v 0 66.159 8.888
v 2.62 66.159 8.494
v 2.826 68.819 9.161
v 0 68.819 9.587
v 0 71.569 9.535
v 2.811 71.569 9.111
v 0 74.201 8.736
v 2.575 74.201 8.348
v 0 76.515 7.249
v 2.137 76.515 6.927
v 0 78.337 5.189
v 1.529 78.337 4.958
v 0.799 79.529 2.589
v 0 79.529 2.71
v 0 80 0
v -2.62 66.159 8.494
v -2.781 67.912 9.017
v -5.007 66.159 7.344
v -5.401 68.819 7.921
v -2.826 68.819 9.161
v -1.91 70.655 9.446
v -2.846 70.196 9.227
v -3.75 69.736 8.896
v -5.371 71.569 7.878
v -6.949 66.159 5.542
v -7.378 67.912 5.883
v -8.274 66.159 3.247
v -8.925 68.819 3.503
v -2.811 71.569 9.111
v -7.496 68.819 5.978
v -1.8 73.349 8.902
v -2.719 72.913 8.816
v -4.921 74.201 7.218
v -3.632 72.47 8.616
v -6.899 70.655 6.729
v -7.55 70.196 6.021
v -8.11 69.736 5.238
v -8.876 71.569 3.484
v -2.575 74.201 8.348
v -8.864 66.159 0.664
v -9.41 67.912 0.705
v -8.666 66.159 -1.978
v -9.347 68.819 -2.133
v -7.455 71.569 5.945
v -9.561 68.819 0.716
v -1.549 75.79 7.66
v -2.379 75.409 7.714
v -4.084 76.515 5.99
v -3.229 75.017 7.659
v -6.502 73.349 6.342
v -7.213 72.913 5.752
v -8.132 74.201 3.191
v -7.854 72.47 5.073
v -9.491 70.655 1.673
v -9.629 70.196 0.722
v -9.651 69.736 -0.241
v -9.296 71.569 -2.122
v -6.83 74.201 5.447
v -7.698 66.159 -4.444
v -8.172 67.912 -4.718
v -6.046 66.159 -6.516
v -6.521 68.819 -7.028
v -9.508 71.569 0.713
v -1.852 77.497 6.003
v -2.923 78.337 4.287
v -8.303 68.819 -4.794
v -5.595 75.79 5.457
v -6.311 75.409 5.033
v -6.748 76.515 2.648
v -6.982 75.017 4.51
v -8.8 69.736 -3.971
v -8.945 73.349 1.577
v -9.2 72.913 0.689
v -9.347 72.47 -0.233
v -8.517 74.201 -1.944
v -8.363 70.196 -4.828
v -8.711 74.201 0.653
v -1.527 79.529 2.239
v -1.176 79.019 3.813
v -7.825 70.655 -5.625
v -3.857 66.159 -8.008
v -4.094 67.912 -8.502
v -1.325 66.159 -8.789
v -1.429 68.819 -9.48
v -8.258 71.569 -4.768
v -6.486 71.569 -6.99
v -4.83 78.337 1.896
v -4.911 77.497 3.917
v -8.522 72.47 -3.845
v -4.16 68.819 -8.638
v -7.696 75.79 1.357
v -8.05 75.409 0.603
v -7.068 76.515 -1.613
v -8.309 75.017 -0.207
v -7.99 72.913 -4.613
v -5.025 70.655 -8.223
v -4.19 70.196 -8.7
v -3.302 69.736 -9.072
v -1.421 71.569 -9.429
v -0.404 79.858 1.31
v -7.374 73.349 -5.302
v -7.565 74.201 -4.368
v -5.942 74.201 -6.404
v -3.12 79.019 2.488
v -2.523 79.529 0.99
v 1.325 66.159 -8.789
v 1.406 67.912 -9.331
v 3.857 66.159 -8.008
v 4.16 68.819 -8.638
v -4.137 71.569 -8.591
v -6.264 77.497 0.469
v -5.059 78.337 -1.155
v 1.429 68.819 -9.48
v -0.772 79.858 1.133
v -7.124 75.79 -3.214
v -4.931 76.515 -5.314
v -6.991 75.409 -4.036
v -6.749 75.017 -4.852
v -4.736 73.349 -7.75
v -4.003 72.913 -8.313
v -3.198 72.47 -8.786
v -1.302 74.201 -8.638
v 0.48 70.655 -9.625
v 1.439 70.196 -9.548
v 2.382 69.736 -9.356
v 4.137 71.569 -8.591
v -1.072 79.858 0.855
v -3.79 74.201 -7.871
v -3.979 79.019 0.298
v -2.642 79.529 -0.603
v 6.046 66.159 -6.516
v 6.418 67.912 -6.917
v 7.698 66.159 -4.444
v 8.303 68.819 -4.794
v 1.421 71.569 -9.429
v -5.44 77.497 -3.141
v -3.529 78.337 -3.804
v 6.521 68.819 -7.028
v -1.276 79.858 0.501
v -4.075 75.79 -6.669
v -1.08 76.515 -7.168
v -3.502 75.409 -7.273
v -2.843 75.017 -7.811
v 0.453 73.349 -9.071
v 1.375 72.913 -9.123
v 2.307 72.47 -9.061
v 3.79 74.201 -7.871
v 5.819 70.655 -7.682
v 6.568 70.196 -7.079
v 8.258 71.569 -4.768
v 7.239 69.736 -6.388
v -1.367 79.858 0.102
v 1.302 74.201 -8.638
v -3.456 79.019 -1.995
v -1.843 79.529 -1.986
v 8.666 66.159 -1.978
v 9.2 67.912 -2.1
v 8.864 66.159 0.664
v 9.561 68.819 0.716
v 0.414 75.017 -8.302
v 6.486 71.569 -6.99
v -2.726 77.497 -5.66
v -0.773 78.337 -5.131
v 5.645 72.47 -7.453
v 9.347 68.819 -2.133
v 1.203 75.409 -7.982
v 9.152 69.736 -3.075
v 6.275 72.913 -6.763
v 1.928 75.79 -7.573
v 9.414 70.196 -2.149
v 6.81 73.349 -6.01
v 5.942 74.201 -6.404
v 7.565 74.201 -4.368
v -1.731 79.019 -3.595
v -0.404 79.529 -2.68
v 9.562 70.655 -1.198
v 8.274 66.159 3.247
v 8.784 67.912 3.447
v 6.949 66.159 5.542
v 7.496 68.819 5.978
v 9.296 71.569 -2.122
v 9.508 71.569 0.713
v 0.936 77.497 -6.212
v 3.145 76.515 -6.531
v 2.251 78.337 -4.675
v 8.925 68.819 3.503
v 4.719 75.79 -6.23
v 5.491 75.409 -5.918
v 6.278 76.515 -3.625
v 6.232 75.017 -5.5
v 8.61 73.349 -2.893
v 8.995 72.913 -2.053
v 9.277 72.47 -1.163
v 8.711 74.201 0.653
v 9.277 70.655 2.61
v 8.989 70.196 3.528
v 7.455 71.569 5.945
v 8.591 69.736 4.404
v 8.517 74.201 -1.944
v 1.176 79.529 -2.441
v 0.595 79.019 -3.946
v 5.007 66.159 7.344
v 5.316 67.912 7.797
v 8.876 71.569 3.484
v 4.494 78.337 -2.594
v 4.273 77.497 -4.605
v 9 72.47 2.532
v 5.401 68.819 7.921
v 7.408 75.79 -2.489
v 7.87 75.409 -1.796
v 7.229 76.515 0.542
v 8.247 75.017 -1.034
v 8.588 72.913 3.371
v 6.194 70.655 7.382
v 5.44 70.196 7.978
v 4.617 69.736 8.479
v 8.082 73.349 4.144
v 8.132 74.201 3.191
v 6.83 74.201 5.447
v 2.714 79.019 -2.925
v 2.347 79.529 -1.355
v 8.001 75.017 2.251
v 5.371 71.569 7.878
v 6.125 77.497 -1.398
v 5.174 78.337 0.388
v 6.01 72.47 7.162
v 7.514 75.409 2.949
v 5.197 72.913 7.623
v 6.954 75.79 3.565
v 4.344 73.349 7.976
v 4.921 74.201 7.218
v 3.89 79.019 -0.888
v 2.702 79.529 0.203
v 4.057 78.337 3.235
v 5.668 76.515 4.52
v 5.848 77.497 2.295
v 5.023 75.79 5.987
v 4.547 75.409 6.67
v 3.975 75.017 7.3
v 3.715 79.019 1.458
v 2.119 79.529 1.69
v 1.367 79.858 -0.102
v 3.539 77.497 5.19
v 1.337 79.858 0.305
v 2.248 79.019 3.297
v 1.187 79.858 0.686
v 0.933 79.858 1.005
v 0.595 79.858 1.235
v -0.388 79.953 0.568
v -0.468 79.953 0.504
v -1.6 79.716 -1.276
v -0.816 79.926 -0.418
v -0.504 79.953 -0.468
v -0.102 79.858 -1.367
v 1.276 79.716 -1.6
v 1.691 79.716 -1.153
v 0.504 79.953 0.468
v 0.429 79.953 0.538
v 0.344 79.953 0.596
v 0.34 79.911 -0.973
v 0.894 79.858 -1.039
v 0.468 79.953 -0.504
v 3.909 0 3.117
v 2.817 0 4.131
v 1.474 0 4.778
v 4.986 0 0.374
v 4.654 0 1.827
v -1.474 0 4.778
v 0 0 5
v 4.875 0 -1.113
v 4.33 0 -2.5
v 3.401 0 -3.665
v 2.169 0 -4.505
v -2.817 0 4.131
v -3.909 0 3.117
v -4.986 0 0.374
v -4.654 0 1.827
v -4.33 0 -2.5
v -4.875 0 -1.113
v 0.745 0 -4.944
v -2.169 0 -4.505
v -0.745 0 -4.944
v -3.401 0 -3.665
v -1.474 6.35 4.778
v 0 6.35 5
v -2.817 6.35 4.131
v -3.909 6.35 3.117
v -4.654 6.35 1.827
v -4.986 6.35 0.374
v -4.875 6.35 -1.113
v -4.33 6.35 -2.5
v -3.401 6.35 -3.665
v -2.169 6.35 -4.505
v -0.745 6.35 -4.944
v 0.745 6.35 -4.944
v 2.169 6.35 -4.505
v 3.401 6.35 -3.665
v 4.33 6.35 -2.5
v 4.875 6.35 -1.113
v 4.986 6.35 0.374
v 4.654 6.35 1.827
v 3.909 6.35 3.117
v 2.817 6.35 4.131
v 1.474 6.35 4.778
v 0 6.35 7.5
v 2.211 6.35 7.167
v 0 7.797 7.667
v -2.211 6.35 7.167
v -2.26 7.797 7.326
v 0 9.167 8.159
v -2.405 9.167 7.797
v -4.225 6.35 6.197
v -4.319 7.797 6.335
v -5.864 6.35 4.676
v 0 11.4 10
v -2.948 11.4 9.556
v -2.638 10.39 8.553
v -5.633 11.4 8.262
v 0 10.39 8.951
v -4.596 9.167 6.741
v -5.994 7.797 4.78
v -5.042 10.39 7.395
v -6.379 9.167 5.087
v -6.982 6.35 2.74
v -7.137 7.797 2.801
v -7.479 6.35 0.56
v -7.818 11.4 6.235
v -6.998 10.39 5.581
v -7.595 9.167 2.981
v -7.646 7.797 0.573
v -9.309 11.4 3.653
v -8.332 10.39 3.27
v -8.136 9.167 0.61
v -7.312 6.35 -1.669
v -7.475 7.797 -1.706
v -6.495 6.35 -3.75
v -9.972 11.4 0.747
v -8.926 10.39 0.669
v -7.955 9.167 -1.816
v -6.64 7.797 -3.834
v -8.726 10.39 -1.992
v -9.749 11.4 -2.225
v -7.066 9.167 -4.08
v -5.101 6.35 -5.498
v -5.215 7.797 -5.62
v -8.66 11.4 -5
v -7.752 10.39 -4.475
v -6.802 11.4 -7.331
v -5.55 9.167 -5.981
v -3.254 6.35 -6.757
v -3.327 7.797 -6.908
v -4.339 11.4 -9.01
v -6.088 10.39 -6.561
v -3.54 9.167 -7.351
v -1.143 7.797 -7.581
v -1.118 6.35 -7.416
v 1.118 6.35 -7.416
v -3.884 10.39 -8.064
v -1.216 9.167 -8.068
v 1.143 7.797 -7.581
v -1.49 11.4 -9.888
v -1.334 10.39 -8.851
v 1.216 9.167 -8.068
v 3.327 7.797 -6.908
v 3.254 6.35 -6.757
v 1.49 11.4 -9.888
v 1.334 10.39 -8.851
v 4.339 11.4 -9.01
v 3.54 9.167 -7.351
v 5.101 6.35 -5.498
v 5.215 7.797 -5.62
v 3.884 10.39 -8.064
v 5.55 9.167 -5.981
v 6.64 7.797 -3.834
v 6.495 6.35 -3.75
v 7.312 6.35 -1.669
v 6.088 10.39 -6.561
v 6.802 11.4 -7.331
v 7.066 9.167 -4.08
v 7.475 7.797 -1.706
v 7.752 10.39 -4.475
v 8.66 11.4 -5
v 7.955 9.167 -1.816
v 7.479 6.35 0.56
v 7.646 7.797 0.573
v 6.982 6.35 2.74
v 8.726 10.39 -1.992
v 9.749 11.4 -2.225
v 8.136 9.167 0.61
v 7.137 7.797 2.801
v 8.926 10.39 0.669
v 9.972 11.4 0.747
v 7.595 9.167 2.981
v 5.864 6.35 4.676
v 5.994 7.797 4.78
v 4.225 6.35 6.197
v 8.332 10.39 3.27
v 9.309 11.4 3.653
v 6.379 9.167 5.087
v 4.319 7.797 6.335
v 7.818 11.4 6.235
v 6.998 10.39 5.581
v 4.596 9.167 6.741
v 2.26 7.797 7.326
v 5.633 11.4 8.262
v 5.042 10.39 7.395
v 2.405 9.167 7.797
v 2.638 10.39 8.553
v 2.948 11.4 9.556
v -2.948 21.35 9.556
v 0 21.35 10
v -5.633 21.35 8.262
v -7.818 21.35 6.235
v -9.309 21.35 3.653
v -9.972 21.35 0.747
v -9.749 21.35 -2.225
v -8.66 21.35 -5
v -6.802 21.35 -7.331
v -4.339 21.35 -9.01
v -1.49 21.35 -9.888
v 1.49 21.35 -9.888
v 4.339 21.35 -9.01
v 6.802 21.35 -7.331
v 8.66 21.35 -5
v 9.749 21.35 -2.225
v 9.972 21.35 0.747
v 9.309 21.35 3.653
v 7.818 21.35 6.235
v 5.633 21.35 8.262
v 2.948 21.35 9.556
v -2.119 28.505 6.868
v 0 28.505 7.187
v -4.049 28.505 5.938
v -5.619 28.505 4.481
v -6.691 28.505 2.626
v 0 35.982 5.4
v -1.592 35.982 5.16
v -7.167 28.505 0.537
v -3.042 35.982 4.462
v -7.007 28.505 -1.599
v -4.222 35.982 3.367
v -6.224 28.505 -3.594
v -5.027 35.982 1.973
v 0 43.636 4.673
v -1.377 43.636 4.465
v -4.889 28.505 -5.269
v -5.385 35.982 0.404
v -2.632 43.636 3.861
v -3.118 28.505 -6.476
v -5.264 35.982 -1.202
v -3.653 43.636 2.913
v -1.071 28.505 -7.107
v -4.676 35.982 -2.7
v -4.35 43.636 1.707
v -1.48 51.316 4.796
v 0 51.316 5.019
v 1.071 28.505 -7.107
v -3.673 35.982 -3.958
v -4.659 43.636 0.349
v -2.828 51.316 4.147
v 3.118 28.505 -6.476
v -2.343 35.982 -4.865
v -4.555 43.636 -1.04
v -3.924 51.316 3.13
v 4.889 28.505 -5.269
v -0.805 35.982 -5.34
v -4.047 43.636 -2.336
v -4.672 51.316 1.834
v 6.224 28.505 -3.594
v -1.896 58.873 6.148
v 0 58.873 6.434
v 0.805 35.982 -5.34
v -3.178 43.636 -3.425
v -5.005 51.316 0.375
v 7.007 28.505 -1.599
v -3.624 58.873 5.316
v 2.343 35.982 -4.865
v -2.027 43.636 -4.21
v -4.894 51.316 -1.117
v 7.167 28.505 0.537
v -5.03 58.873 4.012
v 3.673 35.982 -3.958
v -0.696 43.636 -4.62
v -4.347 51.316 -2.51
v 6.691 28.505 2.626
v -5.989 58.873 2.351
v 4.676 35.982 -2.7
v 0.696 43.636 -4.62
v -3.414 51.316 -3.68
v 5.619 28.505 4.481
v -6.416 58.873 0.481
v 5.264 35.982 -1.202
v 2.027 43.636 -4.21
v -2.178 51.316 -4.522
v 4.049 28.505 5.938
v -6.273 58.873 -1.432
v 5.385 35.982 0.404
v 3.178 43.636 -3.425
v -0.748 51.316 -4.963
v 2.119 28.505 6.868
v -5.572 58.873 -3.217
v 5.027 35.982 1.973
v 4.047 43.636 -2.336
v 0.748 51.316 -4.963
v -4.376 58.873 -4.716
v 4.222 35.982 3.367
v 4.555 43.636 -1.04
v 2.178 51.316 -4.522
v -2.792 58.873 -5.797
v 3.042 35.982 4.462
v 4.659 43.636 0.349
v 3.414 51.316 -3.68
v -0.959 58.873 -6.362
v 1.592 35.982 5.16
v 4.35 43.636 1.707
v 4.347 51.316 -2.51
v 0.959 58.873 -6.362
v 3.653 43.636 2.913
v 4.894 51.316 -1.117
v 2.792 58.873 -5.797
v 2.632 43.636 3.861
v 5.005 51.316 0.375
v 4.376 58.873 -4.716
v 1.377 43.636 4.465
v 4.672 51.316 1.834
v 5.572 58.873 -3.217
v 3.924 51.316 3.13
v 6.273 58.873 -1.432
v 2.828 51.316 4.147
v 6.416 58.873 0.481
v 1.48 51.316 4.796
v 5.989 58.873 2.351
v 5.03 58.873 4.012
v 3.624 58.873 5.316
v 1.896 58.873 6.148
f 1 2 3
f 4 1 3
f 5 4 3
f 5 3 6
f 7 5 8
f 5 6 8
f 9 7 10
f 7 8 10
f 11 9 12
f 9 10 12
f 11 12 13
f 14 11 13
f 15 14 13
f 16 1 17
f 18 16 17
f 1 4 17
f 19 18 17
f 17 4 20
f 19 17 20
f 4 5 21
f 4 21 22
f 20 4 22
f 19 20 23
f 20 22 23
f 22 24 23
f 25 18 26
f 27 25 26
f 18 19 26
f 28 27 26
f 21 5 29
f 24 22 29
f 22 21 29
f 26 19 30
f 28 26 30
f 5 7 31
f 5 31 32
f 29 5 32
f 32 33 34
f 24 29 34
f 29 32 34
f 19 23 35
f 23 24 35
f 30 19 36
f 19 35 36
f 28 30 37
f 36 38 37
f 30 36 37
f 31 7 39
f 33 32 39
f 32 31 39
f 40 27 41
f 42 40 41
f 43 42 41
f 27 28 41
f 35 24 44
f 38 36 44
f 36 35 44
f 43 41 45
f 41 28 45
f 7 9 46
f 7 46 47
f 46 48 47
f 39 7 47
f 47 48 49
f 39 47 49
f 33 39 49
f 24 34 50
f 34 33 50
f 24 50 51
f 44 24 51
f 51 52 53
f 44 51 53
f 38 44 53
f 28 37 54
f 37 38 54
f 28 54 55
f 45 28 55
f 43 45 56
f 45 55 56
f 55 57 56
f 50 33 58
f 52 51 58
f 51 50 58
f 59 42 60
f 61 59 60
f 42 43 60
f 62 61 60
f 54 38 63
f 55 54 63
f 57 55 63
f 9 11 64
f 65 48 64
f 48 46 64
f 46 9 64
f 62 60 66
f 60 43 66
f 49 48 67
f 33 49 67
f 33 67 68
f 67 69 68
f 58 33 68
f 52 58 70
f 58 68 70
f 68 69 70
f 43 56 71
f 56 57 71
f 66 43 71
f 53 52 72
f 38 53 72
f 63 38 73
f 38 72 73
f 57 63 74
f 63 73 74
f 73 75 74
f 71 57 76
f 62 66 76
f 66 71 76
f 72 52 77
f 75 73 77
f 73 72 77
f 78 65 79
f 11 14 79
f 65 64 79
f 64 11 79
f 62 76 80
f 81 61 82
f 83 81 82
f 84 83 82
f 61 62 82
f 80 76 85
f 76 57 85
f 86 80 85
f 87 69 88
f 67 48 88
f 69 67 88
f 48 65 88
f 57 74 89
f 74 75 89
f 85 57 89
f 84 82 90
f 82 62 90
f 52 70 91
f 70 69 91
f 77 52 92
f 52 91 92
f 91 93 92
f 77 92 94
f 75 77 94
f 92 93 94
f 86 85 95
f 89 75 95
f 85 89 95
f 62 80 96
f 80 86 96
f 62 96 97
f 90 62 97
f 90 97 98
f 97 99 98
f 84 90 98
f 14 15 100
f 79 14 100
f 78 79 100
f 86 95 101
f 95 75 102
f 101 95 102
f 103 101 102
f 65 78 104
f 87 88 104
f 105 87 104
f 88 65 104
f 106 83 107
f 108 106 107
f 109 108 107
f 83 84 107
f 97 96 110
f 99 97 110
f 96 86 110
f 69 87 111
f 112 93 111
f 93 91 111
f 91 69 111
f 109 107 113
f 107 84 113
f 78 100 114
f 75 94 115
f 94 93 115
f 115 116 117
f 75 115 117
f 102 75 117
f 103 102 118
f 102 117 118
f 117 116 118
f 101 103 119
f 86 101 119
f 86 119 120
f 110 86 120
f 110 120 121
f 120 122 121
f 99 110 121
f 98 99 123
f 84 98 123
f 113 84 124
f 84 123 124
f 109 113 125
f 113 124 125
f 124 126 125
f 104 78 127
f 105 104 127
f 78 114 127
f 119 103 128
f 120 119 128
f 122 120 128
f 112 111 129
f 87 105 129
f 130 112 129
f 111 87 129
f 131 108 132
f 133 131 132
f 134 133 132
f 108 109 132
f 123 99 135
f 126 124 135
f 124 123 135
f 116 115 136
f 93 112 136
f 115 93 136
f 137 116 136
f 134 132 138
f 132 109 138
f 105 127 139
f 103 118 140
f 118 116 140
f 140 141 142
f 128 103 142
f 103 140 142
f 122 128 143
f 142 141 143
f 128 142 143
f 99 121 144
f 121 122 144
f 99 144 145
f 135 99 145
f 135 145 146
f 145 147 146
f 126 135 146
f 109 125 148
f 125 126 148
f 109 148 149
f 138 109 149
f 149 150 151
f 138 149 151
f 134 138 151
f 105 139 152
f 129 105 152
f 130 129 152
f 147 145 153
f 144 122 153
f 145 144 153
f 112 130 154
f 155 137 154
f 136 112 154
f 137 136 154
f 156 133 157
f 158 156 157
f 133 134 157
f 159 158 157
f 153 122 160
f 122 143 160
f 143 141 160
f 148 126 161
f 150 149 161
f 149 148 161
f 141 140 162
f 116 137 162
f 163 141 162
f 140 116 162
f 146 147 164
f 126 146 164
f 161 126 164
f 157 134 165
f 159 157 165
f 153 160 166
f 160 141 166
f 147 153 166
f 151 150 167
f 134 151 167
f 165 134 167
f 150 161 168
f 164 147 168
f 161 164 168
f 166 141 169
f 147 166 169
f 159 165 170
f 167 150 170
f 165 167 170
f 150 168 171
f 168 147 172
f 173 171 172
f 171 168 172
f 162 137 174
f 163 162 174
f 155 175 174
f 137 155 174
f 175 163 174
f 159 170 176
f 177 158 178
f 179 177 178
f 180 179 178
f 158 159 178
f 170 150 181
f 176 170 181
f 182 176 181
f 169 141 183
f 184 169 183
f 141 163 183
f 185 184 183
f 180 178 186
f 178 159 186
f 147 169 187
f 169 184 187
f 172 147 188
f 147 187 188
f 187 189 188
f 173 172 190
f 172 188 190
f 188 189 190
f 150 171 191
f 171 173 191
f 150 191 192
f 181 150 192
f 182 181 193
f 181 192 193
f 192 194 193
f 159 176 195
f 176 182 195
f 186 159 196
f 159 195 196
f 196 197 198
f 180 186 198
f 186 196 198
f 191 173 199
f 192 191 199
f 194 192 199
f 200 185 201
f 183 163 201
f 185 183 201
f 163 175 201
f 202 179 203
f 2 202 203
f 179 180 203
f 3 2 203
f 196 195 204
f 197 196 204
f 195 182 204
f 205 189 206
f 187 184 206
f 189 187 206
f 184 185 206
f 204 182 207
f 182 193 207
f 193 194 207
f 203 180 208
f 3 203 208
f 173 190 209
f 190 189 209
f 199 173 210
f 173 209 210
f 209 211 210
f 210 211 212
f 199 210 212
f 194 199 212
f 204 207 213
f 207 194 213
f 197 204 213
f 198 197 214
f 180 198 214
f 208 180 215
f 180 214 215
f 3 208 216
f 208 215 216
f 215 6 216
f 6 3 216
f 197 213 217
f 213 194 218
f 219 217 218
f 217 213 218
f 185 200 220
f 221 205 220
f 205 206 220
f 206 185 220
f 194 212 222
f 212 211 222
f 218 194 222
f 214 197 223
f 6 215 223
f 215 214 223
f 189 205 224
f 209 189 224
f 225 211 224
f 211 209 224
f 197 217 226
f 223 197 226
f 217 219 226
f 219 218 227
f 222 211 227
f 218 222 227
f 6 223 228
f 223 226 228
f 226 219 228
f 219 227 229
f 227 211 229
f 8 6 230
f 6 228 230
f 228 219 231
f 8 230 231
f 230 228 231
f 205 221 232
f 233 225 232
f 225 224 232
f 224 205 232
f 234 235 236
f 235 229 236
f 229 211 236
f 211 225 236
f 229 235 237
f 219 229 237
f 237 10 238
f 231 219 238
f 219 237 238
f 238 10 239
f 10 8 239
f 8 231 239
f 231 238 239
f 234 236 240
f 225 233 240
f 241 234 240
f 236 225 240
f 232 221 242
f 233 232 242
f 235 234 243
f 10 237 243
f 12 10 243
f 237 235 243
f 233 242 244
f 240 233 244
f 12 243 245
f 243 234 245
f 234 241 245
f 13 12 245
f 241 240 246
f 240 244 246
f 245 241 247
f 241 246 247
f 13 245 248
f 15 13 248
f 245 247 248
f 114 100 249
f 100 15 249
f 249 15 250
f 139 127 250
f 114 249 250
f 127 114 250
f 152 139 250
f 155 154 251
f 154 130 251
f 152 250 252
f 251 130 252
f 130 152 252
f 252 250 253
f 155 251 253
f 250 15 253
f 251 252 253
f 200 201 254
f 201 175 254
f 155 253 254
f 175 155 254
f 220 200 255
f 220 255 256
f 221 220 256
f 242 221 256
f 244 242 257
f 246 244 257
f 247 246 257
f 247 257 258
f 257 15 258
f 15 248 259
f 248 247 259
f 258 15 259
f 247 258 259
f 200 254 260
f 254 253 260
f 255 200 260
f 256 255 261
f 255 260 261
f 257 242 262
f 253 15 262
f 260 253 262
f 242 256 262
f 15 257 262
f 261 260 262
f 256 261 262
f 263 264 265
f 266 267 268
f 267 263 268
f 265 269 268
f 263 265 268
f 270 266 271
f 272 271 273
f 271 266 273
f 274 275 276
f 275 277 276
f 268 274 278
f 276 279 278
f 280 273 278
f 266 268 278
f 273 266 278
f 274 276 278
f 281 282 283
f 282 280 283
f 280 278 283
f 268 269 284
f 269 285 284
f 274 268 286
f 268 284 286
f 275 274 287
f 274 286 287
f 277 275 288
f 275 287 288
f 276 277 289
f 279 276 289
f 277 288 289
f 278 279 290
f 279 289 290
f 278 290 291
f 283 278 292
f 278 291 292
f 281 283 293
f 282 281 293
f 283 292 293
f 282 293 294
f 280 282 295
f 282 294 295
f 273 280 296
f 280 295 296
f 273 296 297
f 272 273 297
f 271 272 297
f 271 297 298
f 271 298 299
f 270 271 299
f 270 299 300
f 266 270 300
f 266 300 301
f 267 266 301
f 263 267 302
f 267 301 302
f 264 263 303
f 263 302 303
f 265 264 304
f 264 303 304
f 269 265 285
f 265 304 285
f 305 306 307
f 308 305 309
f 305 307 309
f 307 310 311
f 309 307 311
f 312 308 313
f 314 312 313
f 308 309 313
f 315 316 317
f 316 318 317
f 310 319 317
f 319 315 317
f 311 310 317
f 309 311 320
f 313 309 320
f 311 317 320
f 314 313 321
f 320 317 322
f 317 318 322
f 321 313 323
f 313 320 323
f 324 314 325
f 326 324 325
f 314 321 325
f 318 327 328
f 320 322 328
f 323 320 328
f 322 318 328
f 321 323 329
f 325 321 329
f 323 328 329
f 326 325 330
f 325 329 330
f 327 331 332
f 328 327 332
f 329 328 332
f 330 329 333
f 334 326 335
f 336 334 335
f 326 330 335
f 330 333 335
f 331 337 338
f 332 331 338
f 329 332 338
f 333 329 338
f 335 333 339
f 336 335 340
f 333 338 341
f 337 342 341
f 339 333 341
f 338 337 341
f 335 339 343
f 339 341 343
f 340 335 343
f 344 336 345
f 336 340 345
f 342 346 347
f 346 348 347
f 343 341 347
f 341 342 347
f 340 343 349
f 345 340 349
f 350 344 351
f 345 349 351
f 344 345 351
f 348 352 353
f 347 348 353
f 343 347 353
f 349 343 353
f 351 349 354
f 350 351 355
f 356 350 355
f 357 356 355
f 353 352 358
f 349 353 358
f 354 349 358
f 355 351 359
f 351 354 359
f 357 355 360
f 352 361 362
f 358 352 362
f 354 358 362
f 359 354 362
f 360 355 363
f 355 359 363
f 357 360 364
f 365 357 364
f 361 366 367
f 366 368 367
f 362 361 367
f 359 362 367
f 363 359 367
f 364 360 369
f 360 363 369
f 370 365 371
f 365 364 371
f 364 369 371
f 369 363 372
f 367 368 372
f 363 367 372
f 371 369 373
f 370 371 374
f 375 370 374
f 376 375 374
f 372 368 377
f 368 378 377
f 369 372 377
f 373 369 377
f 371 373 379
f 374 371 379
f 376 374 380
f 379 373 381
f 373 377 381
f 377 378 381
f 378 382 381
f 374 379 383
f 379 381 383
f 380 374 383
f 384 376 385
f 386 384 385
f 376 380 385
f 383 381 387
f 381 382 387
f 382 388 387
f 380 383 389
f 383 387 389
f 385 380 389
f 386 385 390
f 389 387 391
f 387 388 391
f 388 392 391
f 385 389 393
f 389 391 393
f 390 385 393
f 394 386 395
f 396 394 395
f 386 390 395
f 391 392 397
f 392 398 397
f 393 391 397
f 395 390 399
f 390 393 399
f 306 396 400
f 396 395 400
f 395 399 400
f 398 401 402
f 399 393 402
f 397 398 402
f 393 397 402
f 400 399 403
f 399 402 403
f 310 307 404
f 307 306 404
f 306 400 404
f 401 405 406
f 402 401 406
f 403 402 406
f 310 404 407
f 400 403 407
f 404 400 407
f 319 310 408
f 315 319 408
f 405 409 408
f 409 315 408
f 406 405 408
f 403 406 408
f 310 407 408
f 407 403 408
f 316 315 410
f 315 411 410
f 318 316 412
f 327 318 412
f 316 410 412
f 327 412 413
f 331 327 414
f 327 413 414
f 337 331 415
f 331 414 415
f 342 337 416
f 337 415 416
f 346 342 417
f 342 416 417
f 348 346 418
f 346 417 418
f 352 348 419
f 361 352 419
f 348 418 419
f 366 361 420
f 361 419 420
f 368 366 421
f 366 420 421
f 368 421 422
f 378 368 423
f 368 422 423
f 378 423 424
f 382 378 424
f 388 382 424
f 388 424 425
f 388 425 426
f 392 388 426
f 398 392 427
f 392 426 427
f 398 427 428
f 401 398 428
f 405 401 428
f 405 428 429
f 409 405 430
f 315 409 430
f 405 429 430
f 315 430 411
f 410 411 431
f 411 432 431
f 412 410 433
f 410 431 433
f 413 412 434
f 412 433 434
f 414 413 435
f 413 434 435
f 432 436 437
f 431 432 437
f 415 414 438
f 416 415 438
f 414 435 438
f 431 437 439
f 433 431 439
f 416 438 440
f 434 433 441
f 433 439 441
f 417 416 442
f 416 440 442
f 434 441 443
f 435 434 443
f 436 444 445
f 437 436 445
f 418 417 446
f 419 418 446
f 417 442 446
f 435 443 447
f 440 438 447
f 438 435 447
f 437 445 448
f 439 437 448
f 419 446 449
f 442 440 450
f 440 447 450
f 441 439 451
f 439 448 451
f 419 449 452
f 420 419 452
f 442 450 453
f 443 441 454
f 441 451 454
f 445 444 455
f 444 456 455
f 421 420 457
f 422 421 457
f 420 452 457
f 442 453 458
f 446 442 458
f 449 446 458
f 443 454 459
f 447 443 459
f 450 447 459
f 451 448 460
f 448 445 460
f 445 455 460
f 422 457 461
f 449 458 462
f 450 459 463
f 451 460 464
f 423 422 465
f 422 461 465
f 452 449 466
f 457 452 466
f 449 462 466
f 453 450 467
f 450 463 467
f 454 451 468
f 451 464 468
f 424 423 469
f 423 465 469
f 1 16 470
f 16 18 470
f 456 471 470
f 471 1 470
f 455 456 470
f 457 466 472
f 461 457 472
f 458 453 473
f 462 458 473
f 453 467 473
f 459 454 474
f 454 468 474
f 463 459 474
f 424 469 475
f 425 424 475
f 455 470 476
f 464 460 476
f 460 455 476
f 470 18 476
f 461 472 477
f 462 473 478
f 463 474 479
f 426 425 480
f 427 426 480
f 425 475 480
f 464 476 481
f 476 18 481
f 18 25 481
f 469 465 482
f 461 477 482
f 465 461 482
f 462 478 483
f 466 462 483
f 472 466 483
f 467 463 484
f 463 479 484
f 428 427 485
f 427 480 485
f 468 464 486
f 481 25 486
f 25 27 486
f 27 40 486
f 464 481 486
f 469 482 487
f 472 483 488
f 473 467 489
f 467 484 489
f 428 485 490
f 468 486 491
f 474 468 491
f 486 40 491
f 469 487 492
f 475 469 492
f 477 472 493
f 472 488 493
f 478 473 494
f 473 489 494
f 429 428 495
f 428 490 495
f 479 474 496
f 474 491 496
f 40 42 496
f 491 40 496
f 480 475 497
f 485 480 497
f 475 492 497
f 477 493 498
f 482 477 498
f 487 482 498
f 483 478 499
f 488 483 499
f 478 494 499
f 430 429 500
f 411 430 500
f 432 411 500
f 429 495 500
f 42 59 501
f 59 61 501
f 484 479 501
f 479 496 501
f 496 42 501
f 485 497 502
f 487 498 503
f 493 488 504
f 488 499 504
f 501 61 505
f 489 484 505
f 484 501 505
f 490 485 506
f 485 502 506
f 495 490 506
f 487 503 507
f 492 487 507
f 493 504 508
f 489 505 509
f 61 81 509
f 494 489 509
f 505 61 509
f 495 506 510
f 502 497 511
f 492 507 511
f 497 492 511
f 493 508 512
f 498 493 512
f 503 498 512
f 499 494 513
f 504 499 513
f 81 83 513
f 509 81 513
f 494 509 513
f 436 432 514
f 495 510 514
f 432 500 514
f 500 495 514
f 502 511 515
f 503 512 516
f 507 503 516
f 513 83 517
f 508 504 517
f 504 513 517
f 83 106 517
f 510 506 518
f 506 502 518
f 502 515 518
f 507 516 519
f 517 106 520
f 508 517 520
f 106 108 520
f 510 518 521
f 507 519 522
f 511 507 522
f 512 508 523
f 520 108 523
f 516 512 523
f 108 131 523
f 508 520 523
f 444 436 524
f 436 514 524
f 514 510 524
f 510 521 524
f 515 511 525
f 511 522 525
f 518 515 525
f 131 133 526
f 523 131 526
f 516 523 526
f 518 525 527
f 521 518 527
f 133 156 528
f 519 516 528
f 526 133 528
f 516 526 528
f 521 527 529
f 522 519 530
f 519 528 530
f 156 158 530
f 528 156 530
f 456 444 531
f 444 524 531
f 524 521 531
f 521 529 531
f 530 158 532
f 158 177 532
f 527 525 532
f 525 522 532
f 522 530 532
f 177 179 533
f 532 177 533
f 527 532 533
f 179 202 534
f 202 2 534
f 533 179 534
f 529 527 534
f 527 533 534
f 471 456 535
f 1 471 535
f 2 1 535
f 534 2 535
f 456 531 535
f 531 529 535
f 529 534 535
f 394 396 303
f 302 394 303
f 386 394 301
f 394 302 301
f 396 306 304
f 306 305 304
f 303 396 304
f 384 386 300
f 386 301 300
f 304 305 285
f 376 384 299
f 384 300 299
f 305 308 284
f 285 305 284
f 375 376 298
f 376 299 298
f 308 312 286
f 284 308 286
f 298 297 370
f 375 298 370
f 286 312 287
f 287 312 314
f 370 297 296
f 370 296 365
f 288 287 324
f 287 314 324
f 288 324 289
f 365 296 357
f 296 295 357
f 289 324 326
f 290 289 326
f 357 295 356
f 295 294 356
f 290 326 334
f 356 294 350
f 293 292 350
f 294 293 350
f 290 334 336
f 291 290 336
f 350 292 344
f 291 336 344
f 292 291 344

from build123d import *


with BuildPart() as part:
    # Sketch1 → Base-Revolve (revolve)
    with BuildSketch(Plane.XY, mode=Mode.PRIVATE) as base_revolve_sk:
        with BuildLine():
            Line((0, 0), (5, 0))
            Line((5, 0), (5, 6.35))
            Line((5, 6.35), (7.5, 6.35))
            ThreePointArc((7.5, 6.35), (8.15921798, 9.167356917), (10, 11.399752469))
            Line((10, 11.399752469), (10, 21.35))
            ThreePointArc((10, 21.35), (4.672504387, 43.636025128), (8.888420475, 66.158795319))
            ThreePointArc((8.888420475, 66.158795319), (8.07243614, 75.409339174), (0, 80))
            Line((0, 80), (0, 0))
        make_face()
    revolve(base_revolve_sk.sketch.rotate(Axis((0, 0, 0), (0, -1, 0)), 90), axis=Axis((0, 0, 0), (0, -1, 0)))


solid = part.part
